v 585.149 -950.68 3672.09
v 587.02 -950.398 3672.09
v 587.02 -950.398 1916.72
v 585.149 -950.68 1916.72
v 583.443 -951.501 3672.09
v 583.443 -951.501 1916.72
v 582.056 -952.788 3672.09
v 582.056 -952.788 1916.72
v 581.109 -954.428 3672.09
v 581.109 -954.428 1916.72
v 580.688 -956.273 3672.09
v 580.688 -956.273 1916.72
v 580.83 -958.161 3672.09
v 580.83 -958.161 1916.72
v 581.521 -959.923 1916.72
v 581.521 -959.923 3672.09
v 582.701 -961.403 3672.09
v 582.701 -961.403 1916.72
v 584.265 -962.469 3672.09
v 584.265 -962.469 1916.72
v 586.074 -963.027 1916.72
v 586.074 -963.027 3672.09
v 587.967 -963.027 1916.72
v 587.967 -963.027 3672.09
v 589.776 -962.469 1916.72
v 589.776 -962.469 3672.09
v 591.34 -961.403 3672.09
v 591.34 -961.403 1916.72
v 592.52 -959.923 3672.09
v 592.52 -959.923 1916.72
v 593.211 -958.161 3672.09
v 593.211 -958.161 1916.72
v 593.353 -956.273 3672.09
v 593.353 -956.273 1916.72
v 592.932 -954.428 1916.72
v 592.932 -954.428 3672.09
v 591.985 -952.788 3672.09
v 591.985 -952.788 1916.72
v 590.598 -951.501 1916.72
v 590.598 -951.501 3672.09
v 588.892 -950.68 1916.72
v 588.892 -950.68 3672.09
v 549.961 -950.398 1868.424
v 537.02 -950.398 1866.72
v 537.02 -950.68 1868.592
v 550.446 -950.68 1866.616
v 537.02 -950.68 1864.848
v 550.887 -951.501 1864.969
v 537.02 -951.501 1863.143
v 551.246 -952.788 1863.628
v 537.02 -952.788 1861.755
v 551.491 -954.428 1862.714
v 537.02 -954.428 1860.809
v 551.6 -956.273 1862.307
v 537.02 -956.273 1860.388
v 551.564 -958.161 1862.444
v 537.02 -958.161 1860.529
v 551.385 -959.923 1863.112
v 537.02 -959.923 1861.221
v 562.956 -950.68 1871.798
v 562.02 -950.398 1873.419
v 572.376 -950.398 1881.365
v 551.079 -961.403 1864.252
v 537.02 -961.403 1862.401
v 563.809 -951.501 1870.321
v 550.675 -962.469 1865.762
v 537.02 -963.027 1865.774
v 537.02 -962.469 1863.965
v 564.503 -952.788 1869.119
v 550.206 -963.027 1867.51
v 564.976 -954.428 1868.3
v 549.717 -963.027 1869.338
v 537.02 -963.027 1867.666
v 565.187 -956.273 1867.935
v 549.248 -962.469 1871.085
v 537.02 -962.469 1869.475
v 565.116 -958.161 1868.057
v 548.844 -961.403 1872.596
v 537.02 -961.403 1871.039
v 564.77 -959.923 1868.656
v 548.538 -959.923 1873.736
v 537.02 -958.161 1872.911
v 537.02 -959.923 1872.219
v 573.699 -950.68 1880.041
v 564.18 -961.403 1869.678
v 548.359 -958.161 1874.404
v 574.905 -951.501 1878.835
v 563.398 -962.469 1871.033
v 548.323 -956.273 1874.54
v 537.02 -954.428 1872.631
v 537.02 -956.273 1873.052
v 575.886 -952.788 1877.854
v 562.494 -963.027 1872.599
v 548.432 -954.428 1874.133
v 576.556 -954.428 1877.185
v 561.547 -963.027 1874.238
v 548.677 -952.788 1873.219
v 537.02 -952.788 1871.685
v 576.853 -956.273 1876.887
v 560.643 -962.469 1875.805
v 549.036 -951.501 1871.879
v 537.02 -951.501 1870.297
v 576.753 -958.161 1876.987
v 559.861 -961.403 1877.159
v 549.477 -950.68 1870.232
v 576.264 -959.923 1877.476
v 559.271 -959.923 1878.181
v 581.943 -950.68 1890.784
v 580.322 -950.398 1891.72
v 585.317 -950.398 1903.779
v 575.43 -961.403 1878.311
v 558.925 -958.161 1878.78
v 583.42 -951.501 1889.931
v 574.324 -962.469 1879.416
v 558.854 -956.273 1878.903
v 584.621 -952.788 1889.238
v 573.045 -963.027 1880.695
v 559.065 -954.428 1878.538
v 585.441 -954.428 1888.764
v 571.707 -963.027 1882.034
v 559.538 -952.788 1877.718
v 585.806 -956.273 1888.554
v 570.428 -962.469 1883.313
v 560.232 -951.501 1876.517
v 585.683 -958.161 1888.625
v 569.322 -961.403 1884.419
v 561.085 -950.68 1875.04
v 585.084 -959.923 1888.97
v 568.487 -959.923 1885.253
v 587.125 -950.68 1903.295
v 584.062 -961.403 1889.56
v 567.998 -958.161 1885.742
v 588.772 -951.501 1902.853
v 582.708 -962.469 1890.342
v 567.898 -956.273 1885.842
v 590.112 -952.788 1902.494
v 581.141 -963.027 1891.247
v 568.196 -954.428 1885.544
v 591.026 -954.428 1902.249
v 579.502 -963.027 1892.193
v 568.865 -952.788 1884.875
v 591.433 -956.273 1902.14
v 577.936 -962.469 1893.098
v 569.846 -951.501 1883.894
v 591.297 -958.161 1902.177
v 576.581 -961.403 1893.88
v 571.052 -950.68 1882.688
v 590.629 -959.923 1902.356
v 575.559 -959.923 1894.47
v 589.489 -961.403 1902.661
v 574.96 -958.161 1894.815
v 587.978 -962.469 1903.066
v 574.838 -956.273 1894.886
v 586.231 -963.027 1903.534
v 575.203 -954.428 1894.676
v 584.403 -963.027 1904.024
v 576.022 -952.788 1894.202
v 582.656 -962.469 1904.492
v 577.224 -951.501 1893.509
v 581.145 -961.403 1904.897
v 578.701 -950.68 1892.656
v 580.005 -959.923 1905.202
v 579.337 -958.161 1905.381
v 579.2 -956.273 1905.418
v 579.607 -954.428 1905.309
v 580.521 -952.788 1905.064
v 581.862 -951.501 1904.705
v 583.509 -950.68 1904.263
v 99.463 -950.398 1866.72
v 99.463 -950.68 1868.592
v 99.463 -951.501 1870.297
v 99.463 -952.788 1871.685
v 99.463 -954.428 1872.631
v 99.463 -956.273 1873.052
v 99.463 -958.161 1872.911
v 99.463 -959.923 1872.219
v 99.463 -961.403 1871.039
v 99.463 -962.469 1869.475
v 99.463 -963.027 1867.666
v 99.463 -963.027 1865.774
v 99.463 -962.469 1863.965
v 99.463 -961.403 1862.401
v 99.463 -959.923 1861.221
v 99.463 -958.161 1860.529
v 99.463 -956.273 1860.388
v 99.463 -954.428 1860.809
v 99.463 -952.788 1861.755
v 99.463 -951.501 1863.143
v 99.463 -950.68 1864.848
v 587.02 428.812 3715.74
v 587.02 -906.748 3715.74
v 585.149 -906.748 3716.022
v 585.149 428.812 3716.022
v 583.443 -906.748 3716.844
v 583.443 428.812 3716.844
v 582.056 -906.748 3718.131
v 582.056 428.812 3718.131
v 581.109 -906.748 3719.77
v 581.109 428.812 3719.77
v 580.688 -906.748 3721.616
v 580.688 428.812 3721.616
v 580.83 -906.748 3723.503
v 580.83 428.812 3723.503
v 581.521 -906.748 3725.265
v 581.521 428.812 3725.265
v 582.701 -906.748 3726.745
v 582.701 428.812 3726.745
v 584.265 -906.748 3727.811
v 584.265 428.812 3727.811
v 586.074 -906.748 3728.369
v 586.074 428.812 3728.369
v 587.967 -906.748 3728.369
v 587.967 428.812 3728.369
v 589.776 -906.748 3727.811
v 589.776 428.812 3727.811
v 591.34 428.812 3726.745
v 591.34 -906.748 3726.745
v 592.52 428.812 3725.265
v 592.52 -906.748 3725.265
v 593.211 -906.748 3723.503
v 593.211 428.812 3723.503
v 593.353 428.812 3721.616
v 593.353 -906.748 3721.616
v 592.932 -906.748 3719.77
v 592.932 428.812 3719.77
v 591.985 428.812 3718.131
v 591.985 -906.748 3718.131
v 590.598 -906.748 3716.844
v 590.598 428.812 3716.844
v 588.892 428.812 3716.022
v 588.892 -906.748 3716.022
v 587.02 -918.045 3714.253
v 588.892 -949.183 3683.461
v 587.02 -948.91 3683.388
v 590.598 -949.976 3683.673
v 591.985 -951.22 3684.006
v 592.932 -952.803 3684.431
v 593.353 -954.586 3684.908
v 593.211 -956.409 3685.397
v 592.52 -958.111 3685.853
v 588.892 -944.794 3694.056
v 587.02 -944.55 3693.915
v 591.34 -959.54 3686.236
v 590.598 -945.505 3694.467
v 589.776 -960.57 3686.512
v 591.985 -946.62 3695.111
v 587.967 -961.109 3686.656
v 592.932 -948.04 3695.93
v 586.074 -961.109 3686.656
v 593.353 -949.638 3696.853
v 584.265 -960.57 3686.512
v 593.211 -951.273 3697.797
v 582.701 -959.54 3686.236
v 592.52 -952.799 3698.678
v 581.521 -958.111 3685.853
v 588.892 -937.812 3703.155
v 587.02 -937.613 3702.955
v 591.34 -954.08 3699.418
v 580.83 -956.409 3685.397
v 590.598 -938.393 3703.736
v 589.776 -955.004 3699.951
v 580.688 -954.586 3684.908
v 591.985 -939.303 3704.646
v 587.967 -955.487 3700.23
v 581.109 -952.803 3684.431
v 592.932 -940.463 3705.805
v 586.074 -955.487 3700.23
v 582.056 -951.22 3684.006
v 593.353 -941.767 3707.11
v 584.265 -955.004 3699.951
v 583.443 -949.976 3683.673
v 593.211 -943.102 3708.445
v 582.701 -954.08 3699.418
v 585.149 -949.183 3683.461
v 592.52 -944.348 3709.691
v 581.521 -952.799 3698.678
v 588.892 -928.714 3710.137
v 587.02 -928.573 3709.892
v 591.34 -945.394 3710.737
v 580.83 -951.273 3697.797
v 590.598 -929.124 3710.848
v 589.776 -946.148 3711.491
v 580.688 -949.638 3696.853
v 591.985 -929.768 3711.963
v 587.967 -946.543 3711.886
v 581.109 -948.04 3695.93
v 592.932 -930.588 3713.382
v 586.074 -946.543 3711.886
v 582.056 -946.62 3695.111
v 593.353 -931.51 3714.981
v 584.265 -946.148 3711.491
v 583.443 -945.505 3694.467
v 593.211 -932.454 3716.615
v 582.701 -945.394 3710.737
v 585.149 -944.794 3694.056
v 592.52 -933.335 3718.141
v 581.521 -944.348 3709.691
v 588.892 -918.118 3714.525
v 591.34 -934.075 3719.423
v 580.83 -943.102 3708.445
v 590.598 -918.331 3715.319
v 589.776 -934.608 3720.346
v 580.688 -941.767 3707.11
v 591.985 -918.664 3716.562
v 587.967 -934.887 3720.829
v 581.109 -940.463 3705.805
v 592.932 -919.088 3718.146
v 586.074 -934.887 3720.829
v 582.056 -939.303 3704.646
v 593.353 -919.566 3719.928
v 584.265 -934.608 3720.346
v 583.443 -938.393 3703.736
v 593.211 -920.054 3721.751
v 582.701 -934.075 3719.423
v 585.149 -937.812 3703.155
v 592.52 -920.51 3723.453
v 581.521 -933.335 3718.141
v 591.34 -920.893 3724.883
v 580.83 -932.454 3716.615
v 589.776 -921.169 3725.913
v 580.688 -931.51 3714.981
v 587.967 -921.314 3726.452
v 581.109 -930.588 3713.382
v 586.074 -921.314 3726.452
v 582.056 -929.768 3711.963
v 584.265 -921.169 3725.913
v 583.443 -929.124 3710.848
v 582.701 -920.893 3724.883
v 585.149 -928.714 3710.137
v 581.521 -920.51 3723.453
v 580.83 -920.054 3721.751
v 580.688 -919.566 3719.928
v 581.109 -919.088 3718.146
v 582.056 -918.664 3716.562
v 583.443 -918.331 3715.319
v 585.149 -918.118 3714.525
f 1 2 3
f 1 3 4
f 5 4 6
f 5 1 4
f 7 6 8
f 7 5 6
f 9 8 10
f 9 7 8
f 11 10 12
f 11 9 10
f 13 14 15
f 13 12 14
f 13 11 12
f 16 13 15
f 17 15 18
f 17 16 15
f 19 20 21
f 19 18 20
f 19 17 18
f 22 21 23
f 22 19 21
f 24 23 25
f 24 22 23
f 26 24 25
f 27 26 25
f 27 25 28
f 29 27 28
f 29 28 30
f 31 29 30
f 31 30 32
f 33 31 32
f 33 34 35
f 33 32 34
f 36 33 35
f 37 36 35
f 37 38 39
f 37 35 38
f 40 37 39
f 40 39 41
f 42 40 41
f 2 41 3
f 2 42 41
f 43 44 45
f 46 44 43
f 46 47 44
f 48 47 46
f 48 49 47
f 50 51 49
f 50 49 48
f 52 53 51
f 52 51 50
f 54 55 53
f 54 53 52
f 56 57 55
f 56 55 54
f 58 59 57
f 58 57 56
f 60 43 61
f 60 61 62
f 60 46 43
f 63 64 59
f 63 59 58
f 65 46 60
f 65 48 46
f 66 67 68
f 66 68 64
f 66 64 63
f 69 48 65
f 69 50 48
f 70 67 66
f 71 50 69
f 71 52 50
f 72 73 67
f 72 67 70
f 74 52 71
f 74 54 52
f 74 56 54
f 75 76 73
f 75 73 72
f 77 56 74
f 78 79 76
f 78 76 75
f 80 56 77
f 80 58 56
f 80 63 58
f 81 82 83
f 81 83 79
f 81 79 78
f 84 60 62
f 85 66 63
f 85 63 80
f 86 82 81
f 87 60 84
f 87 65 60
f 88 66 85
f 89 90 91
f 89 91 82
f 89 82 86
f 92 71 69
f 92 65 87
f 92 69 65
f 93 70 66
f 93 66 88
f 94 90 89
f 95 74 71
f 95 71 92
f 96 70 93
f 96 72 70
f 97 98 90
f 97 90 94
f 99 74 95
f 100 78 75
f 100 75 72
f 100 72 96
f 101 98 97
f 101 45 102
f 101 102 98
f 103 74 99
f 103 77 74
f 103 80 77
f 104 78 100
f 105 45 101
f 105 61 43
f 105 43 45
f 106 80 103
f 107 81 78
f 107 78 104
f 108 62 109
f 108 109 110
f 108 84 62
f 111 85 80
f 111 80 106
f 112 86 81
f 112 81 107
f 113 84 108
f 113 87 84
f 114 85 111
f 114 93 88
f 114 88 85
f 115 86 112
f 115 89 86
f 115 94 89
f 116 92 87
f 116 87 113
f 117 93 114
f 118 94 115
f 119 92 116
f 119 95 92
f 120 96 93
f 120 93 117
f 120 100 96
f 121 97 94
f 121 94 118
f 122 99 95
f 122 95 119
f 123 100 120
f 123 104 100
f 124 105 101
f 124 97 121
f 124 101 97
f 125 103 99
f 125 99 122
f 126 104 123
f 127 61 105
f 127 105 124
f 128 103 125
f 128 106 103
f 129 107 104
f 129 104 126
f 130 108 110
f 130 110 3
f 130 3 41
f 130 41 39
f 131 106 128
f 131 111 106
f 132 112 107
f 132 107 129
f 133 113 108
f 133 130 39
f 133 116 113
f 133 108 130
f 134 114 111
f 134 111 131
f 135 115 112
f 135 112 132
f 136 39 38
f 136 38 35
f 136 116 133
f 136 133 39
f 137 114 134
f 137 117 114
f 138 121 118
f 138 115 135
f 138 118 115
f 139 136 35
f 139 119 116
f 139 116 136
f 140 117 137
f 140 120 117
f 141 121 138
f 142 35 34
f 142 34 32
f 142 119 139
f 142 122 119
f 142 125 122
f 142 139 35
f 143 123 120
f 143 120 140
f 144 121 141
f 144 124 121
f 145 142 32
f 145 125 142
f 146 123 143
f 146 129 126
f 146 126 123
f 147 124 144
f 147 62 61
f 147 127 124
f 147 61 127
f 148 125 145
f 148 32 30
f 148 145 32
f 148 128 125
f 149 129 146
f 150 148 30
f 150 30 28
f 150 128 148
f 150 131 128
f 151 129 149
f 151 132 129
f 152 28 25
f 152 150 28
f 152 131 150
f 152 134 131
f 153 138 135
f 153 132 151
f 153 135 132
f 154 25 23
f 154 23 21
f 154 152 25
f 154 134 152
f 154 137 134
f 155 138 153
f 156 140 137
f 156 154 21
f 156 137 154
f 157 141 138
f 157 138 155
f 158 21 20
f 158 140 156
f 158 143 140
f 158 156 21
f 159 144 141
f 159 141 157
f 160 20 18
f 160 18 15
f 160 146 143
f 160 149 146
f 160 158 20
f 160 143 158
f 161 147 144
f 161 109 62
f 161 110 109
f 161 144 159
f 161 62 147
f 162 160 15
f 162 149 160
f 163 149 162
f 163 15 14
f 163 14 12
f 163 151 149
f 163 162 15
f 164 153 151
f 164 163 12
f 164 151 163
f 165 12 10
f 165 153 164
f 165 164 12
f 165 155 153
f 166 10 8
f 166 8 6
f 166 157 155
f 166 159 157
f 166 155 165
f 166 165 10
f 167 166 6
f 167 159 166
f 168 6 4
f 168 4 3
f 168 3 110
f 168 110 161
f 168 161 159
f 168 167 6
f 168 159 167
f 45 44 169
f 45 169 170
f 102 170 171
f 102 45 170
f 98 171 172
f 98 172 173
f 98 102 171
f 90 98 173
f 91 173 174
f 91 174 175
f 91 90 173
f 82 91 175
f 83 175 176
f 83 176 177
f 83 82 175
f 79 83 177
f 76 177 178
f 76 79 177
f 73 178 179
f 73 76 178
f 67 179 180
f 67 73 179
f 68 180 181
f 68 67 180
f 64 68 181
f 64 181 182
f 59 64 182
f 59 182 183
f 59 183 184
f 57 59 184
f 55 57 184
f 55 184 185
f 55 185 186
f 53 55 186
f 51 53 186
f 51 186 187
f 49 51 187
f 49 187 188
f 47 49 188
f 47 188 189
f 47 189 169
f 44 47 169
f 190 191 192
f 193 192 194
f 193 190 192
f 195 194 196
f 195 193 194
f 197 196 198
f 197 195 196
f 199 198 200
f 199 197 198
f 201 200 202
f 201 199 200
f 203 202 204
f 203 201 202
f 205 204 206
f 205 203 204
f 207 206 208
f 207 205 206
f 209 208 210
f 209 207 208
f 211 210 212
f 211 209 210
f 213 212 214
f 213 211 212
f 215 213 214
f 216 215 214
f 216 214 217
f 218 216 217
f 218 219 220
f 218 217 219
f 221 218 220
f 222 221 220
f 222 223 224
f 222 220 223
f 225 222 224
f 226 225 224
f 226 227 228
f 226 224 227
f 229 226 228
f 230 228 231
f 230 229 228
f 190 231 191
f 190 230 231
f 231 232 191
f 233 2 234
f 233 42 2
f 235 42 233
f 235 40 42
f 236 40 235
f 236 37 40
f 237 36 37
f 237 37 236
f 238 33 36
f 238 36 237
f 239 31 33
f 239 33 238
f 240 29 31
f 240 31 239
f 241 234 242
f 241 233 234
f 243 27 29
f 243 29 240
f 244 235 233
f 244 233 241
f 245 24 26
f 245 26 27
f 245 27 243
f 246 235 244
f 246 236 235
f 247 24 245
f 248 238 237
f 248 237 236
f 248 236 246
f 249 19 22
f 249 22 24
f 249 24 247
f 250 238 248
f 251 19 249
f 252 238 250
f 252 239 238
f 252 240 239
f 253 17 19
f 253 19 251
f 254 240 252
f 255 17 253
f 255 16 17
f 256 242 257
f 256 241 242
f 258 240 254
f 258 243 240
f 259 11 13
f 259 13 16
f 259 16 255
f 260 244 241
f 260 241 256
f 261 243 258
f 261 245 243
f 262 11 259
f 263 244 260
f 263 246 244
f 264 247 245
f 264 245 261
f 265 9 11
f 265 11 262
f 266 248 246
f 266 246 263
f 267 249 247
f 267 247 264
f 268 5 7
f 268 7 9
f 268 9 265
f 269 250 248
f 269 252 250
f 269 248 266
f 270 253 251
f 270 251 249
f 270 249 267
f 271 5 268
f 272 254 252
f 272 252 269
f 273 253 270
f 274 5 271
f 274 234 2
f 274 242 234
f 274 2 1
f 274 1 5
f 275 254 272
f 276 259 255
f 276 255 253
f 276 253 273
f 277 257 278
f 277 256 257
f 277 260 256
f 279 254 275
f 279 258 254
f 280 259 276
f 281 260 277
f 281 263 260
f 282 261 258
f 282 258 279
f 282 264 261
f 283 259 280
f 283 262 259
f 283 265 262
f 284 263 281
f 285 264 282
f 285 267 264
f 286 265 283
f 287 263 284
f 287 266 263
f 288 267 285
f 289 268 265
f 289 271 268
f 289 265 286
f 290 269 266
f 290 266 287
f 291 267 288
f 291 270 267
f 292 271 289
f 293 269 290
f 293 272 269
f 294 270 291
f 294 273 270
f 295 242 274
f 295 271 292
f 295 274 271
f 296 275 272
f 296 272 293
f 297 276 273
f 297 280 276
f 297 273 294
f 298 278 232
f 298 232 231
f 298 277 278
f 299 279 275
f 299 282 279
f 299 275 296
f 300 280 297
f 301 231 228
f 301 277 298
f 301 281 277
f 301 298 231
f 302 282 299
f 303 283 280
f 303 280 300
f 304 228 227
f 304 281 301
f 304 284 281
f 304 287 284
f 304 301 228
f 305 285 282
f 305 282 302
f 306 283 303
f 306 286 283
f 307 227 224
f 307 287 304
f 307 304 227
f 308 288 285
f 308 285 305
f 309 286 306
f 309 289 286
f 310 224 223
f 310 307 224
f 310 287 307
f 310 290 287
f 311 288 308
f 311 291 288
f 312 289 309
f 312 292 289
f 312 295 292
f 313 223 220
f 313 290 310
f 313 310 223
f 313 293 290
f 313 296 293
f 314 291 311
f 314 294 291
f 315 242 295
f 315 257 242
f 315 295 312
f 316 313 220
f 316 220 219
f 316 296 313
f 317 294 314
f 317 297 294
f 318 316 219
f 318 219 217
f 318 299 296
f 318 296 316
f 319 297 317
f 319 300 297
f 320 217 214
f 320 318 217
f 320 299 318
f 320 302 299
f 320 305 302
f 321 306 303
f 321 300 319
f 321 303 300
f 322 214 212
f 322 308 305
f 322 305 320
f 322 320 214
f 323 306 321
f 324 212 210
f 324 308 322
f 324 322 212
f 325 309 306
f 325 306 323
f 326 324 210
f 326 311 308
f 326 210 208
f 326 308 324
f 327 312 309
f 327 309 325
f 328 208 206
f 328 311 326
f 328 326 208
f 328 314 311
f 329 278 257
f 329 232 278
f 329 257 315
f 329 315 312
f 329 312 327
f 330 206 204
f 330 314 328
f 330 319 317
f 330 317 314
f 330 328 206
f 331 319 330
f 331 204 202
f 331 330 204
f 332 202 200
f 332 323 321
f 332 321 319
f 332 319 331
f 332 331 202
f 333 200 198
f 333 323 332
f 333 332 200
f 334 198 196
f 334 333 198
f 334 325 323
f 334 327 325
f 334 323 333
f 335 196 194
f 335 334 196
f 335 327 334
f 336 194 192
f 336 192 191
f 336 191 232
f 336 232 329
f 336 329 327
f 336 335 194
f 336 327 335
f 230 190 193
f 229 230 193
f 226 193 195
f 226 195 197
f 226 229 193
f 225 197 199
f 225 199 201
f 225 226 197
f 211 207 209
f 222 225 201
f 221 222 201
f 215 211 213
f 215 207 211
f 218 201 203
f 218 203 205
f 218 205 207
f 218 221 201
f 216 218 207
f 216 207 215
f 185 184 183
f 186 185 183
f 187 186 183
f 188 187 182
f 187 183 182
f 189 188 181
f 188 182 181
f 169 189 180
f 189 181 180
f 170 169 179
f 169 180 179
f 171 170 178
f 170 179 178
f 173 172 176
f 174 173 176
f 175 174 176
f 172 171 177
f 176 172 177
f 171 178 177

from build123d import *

# Parameters (mm, degrees)
BARRER3_PROFILE_R = 6.35


with BuildPart() as part:
    # Barrer3: sweep along a curve in space
    with BuildLine() as barrer3_path:
        Line((99.462798079, -956.74763274, 1866.72), (537.020499739, -956.74763274, 1866.72))
        ThreePointArc((537.020499739, -956.74763274, 1866.72), (572.375838799, -956.74763274, 1881.364660941), (587.020499739, -956.74763274, 1916.72))
        Line((587.020499739, -956.74763274, 1916.72), (587.020499739, -956.74763274, 3672.090203728))
        ThreePointArc((587.020499739, -956.74763274, 3672.090203728), (587.020499739, -942.102971799, 3707.445542787), (587.020499739, -906.74763274, 3722.090203728))
        Line((587.020499739, -906.74763274, 3722.090203728), (587.020499739, 428.812094771, 3722.090203728))
    # Barrer3 profile (on start of the path) → Barrer3 (sweep)
    with BuildSketch(Plane(origin=(99.462798079, -956.74763274, 1866.72), x_dir=(0, 1, 0), z_dir=(1, 0, 0))):
        Circle(BARRER3_PROFILE_R)
    sweep(path=barrer3_path.line)


solid = part.part
